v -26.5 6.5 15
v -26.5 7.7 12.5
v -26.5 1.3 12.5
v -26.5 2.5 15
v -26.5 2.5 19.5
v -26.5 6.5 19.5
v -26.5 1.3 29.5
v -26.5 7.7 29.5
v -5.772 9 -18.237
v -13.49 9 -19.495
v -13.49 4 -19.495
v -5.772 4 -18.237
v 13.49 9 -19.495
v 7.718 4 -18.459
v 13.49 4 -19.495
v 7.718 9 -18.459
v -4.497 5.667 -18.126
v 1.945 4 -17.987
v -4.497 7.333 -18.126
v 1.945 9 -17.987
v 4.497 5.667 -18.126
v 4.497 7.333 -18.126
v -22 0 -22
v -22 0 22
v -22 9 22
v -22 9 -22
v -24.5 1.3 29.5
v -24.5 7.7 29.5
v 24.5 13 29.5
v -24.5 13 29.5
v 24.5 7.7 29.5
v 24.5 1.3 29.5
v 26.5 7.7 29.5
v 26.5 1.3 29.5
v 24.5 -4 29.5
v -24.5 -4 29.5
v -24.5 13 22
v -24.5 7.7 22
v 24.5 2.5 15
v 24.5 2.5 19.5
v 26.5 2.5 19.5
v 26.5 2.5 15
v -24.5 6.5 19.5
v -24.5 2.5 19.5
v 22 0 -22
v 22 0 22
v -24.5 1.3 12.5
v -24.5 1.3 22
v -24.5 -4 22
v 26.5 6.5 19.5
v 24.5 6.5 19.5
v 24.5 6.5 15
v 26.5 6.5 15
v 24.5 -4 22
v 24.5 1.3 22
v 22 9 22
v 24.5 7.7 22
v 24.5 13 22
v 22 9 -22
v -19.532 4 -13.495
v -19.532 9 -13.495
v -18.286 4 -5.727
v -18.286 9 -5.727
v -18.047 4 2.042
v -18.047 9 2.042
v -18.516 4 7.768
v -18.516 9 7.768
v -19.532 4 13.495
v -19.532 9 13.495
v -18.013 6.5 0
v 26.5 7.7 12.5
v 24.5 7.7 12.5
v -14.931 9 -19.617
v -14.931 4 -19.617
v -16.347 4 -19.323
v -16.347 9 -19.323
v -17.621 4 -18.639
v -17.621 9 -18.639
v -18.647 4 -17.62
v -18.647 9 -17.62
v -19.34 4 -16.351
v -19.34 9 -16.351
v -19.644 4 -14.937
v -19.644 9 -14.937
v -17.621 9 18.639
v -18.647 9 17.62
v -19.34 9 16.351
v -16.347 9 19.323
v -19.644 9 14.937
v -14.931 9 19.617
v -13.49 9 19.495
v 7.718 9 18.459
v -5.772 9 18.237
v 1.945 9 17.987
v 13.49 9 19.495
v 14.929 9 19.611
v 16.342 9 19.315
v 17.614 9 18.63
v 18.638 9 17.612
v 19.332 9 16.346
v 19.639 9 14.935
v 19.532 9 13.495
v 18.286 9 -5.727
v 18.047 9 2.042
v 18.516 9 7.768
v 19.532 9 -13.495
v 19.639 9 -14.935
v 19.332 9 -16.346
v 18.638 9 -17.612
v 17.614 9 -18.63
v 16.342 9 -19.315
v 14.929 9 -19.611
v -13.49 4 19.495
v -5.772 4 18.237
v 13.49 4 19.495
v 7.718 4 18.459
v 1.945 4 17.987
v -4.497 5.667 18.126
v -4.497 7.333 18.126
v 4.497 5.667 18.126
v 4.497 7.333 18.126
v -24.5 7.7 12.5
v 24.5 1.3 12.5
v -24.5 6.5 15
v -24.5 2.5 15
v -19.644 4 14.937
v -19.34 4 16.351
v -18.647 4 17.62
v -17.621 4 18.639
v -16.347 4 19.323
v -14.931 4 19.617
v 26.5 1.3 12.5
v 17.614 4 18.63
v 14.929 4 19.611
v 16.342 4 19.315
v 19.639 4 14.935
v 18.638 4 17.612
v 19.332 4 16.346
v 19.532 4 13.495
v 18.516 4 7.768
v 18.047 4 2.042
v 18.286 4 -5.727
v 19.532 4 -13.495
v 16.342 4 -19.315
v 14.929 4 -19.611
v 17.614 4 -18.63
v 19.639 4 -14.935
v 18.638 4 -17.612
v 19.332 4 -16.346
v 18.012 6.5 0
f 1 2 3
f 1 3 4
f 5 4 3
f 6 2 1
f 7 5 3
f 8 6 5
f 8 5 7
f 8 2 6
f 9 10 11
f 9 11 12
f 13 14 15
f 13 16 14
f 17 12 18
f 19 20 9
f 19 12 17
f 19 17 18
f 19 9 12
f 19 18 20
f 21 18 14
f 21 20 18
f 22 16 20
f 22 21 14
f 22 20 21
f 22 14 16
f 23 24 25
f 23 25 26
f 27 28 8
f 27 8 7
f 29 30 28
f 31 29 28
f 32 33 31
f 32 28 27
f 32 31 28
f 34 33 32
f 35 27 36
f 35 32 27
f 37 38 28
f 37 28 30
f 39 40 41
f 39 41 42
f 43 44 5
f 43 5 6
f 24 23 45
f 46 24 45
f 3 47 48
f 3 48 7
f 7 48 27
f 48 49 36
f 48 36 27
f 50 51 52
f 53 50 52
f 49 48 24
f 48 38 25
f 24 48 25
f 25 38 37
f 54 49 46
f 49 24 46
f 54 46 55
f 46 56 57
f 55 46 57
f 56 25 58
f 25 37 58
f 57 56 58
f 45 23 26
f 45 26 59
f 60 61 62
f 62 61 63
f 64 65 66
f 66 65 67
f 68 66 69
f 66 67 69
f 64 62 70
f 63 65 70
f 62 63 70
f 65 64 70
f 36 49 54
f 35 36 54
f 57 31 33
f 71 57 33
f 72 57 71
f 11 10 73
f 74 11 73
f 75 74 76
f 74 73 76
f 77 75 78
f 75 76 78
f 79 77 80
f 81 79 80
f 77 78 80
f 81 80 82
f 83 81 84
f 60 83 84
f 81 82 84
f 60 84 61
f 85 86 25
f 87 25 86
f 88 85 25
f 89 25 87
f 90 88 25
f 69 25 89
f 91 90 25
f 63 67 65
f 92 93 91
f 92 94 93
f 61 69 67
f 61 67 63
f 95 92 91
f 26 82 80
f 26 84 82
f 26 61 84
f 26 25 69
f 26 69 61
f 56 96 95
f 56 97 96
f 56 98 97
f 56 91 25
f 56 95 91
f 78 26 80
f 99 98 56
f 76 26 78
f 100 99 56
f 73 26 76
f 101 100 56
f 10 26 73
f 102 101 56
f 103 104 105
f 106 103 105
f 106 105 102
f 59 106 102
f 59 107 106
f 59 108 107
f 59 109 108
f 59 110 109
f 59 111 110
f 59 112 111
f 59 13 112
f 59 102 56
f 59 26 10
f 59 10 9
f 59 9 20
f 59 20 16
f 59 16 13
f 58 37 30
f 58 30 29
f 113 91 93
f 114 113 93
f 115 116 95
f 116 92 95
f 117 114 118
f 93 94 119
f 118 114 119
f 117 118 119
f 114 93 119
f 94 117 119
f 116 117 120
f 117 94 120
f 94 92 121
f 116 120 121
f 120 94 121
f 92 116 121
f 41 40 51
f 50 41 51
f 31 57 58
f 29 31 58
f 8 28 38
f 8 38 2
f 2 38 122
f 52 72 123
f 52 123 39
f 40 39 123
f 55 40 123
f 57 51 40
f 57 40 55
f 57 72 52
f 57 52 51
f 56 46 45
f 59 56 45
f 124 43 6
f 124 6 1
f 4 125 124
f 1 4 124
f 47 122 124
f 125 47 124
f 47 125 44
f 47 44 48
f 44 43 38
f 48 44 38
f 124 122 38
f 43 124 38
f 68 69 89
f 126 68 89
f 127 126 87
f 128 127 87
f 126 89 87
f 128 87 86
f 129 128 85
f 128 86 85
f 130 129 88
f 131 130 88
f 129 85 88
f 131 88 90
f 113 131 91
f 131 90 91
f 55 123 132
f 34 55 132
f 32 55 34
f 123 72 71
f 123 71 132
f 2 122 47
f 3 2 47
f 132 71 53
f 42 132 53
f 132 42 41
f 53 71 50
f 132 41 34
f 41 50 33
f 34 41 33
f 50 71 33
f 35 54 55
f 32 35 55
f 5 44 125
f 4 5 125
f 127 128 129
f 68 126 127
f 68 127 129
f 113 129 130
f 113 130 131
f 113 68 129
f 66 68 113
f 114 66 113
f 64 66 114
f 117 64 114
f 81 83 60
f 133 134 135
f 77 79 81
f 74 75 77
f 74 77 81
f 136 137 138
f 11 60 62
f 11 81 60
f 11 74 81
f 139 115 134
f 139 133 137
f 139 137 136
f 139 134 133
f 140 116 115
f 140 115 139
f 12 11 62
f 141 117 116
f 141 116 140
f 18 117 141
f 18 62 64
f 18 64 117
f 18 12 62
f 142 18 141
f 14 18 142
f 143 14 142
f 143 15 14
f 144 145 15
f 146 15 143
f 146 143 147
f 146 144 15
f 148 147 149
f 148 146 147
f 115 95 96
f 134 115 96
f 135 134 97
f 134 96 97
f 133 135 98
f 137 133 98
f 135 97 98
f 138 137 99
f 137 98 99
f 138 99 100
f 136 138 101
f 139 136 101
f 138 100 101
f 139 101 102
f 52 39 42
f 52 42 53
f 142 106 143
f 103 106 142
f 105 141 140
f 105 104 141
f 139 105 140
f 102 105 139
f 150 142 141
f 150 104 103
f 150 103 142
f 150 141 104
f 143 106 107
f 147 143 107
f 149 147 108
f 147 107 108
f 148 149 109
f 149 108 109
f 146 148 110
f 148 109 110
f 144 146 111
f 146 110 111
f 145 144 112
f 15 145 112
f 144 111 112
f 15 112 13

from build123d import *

# Parameters (mm, degrees)
SKETCH1_W           = 44
SKETCH1_H           = 44
BOSS_EXTRUDE1_DEPTH = 9
SKETCH2_W           = 49
SKETCH2_H           = 17
BOSS_EXTRUDE2_DEPTH = 7.5
CUT_EXTRUDE1_DEPTH  = 5
SKETCH4_W           = 4.5
SKETCH4_H           = 4
BOSS_EXTRUDE3_DEPTH = 2


with BuildPart() as part:
    # Sketch1 → Boss-Extrude1 (new body)
    with BuildSketch(Plane(origin=(0, 0, 0), x_dir=(1, 0, 0), z_dir=(0, 1, 0))):
        Rectangle(SKETCH1_W, SKETCH1_H)
    extrude(amount=BOSS_EXTRUDE1_DEPTH)

    # Sketch2 → Boss-Extrude2 (add)
    with BuildSketch(Plane.XY.offset(22)):
        with Locations((0, 4.5)):
            Rectangle(SKETCH2_W, SKETCH2_H)
    extrude(amount=BOSS_EXTRUDE2_DEPTH)

    # Sketch3 → Cut-Extrude1 (cut)
    with BuildSketch(Plane(origin=(0, 9, 0), x_dir=(1, 0, 0), z_dir=(0, 1, 0))):
        with BuildLine():
            ThreePointArc((-19.5325, -13.495), (-18.170661955, -18.166166123), (-13.49, -19.495))
            add(Edge.make_bspline(
                [(-13.49, -19.495), (-4.496666667, -17.441666667), (4.496666667, -17.441666667), (13.49, -19.495)],
                knots=[0, 0, 0, 0, 1, 1, 1, 1], degree=3))
            ThreePointArc((13.49, -19.495), (18.162524477, -18.157971004), (19.5325, -13.495))
            add(Edge.make_bspline(
                [(19.5325, 13.495), (16.4925, 0), (19.5325, -13.495)],
                knots=[0, 0, 0, 1, 1, 1], degree=2))
            ThreePointArc((19.5325, 13.495), (18.162524477, 18.157971004), (13.49, 19.495))
            add(Edge.make_bspline(
                [(-13.49, 19.495), (-4.496666667, 17.441666667), (4.496666667, 17.441666667), (13.49, 19.495)],
                knots=[0, 0, 0, 0, 1, 1, 1, 1], degree=3))
            ThreePointArc((-13.49, 19.495), (-18.170661955, 18.166166123), (-19.5325, 13.495))
            add(Edge.make_bspline(
                [(-19.5325, 13.495), (-18.519166667, 8.996666667), (-17.505833333, 0), (-18.519166667, -8.996666667), (-19.5325, -13.495)],
                knots=[0, 0, 0, 0, 0.5, 1, 1, 1, 1], degree=3))
        make_face()
    extrude(amount=-CUT_EXTRUDE1_DEPTH, mode=Mode.SUBTRACT)

    # Sketch4 → Boss-Extrude3 (add)
    with BuildSketch(Plane(origin=(24.5, 0, 0), x_dir=(0, 0, -1), z_dir=(1, 0, 0))):
        Polygon((-29.5, 4.5), (-29.5, 7.7), (-12.5, 7.7), (-12.5, 1.3), (-29.5, 1.3), align=None)
        with Locations((-17.25, 4.5)):
            Rectangle(SKETCH4_W, SKETCH4_H, mode=Mode.SUBTRACT)
    boss_extrude3 = extrude(amount=BOSS_EXTRUDE3_DEPTH)

    # Mirror1: Boss-Extrude3 across plane
    add(boss_extrude3.mirror(Plane(origin=(0, 0, 0), x_dir=(0, 0, 1), z_dir=(1, 0, 0))))


solid = part.part
